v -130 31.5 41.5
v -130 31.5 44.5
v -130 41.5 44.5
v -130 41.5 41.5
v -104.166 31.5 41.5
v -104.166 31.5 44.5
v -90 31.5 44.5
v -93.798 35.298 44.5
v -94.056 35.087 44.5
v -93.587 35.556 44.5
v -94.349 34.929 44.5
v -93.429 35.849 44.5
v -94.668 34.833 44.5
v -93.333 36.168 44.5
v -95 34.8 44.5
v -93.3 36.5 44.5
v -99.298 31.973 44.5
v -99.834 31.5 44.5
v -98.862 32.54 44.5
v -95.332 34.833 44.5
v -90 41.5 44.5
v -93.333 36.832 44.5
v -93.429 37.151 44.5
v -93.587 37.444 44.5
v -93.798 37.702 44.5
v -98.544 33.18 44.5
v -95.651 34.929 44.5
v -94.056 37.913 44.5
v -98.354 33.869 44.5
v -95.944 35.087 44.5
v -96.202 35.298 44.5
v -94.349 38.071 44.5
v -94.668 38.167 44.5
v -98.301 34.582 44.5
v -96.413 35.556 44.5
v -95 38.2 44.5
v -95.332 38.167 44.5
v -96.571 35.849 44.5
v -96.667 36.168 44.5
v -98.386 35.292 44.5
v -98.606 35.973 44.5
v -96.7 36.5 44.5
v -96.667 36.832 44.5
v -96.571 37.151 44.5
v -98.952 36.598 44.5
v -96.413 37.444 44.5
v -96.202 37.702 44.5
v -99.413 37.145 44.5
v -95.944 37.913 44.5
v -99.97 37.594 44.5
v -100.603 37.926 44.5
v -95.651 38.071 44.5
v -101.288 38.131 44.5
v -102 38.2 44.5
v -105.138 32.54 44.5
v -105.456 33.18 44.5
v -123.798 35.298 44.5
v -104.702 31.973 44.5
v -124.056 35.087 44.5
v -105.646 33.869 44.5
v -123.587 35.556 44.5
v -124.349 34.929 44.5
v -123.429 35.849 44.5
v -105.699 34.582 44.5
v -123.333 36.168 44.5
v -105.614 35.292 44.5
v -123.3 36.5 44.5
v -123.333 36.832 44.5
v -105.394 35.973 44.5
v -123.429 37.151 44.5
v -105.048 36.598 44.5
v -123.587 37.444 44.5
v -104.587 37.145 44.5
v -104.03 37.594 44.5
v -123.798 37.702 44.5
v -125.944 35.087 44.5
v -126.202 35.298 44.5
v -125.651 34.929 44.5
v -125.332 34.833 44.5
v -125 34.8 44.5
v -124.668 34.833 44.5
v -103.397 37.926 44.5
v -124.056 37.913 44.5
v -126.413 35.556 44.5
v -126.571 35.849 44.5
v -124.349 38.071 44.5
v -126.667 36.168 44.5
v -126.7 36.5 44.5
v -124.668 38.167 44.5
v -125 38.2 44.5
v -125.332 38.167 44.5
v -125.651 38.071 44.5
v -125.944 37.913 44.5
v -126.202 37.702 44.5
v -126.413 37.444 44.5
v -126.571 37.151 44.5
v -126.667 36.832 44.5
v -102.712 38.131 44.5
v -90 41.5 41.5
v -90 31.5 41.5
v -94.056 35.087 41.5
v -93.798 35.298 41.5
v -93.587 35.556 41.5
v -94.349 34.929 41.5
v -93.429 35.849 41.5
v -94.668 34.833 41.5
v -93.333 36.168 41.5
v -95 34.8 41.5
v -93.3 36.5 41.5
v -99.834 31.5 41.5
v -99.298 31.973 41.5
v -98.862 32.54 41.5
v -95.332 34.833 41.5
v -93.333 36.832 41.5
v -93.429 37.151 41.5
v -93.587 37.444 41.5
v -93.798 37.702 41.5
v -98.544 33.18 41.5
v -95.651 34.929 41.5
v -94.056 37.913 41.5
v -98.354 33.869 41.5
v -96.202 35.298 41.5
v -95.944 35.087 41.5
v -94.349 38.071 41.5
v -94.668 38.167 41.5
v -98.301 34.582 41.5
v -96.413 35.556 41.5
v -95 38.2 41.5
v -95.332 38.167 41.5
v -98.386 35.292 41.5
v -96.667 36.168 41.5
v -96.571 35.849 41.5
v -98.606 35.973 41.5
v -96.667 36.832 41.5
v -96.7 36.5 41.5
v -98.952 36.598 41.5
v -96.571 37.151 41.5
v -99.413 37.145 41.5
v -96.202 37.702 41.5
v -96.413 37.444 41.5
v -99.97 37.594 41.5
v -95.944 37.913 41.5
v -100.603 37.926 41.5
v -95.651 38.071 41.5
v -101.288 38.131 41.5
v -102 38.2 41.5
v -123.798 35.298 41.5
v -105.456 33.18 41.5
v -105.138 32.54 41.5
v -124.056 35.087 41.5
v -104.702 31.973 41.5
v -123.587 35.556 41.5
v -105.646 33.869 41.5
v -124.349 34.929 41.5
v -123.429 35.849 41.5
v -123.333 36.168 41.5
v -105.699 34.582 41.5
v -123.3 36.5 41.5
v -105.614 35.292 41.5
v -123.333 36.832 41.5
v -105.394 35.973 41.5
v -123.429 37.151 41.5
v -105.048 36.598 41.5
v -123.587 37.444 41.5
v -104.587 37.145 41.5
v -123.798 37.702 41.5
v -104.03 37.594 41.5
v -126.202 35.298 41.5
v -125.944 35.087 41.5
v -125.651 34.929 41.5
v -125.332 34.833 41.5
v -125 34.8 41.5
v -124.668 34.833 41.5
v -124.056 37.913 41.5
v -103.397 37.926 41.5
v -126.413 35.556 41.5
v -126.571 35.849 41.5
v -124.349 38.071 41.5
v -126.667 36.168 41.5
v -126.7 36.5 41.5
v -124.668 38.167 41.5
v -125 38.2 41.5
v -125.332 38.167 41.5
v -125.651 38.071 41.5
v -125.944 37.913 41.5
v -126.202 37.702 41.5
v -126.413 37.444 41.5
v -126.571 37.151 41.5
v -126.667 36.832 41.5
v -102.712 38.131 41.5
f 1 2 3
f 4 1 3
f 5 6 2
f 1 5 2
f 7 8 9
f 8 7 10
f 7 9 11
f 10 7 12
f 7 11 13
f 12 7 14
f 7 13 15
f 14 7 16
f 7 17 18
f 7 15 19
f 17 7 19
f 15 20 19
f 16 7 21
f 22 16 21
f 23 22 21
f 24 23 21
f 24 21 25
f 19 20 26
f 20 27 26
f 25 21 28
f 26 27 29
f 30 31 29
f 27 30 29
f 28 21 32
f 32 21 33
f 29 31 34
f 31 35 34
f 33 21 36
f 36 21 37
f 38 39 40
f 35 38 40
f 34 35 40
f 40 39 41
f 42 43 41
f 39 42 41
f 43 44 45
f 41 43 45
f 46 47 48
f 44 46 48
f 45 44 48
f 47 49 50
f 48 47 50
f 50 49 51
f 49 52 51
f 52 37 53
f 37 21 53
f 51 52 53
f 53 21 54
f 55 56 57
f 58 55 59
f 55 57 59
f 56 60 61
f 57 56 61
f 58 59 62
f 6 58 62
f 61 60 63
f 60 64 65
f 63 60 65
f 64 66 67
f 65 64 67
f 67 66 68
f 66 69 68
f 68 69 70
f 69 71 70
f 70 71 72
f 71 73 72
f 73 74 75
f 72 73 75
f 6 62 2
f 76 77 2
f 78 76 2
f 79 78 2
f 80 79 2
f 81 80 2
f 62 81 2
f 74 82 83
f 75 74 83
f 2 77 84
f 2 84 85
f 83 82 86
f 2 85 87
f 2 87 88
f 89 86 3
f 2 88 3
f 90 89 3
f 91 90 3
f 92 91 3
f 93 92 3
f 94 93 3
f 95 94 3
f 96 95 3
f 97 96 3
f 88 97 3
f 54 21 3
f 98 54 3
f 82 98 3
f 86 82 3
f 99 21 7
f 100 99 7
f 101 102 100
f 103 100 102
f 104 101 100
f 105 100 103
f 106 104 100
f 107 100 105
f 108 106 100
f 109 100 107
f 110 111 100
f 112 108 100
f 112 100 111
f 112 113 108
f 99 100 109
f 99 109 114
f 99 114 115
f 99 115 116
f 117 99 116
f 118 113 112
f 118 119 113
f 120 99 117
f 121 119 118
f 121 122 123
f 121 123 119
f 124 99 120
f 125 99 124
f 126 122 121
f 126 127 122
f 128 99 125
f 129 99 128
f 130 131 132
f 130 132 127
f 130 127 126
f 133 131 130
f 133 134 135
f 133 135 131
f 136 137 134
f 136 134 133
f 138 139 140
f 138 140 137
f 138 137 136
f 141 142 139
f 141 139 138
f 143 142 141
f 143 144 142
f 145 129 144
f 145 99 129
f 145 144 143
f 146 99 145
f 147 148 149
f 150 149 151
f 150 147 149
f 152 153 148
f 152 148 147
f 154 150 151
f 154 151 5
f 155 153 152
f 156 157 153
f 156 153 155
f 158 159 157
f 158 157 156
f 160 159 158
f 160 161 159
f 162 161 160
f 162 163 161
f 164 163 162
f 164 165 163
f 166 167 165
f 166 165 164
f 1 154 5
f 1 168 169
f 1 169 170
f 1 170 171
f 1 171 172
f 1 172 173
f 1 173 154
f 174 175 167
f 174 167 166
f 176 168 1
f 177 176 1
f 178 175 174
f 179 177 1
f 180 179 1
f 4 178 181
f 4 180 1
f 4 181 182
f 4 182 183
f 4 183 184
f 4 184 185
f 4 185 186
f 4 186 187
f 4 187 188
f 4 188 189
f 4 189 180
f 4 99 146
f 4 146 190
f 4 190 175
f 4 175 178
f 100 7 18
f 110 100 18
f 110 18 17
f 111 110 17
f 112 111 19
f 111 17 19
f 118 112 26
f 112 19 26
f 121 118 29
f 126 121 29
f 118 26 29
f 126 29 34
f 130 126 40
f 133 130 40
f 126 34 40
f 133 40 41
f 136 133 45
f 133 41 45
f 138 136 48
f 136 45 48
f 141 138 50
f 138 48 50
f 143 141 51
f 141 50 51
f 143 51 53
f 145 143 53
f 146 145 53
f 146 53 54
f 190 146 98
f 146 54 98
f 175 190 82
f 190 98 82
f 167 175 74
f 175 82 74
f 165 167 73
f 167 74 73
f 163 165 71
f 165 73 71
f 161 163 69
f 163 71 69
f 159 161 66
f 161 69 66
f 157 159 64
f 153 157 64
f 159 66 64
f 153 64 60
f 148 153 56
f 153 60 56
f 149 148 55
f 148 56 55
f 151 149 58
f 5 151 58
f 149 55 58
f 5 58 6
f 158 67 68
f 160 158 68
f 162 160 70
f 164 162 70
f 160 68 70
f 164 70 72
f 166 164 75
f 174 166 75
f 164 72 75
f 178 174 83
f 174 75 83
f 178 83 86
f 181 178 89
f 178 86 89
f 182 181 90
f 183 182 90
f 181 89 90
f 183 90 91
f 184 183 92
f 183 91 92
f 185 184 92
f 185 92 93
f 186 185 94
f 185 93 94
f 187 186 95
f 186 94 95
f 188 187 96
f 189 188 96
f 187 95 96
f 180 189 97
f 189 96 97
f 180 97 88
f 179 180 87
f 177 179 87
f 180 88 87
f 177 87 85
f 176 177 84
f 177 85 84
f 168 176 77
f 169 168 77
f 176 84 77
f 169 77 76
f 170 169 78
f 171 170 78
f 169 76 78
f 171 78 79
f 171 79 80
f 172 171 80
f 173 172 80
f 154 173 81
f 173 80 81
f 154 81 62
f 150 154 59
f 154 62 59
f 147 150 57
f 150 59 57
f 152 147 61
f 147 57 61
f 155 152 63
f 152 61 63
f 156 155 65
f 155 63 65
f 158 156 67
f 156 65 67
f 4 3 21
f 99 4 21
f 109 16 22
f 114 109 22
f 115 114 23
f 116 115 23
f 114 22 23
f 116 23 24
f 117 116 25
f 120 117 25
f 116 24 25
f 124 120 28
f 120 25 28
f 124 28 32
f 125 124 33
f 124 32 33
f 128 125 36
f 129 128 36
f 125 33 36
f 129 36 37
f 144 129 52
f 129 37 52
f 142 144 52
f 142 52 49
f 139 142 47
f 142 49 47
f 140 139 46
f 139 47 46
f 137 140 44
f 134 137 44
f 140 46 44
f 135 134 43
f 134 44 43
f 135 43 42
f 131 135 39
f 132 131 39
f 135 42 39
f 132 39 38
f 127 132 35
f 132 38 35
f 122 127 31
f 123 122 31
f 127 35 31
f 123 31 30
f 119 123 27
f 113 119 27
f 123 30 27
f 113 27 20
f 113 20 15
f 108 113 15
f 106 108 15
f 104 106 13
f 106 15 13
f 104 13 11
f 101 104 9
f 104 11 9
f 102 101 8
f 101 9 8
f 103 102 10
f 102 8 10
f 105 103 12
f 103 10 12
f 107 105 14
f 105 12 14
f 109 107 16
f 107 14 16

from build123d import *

# Parameters (mm, degrees)
MAIN_PROFILE_SKETCH_R = 1.7
MAIN_EXTRUSION_DEPTH  = 3


with BuildPart() as part:
    # Main Profile Sketch → Main Extrusion (new body)
    with BuildSketch(Plane.XY.offset(44.5)):
        with BuildLine():
            Line((-130, 41.5), (-90, 41.5))
            Line((-90, 41.5), (-90, 31.5))
            Line((-90, 31.5), (-99.834359217, 31.5))
            ThreePointArc((-99.834359217, 31.5), (-102, 38.2), (-104.165640783, 31.5))
            Line((-104.165640783, 31.5), (-130, 31.5))
            Line((-130, 31.5), (-130, 41.5))
        make_face()
        with Locations((-125, 36.5)):
            Circle(MAIN_PROFILE_SKETCH_R, mode=Mode.SUBTRACT)
        with Locations((-95, 36.5)):
            Circle(MAIN_PROFILE_SKETCH_R, mode=Mode.SUBTRACT)
    extrude(amount=-MAIN_EXTRUSION_DEPTH)


solid = part.part
